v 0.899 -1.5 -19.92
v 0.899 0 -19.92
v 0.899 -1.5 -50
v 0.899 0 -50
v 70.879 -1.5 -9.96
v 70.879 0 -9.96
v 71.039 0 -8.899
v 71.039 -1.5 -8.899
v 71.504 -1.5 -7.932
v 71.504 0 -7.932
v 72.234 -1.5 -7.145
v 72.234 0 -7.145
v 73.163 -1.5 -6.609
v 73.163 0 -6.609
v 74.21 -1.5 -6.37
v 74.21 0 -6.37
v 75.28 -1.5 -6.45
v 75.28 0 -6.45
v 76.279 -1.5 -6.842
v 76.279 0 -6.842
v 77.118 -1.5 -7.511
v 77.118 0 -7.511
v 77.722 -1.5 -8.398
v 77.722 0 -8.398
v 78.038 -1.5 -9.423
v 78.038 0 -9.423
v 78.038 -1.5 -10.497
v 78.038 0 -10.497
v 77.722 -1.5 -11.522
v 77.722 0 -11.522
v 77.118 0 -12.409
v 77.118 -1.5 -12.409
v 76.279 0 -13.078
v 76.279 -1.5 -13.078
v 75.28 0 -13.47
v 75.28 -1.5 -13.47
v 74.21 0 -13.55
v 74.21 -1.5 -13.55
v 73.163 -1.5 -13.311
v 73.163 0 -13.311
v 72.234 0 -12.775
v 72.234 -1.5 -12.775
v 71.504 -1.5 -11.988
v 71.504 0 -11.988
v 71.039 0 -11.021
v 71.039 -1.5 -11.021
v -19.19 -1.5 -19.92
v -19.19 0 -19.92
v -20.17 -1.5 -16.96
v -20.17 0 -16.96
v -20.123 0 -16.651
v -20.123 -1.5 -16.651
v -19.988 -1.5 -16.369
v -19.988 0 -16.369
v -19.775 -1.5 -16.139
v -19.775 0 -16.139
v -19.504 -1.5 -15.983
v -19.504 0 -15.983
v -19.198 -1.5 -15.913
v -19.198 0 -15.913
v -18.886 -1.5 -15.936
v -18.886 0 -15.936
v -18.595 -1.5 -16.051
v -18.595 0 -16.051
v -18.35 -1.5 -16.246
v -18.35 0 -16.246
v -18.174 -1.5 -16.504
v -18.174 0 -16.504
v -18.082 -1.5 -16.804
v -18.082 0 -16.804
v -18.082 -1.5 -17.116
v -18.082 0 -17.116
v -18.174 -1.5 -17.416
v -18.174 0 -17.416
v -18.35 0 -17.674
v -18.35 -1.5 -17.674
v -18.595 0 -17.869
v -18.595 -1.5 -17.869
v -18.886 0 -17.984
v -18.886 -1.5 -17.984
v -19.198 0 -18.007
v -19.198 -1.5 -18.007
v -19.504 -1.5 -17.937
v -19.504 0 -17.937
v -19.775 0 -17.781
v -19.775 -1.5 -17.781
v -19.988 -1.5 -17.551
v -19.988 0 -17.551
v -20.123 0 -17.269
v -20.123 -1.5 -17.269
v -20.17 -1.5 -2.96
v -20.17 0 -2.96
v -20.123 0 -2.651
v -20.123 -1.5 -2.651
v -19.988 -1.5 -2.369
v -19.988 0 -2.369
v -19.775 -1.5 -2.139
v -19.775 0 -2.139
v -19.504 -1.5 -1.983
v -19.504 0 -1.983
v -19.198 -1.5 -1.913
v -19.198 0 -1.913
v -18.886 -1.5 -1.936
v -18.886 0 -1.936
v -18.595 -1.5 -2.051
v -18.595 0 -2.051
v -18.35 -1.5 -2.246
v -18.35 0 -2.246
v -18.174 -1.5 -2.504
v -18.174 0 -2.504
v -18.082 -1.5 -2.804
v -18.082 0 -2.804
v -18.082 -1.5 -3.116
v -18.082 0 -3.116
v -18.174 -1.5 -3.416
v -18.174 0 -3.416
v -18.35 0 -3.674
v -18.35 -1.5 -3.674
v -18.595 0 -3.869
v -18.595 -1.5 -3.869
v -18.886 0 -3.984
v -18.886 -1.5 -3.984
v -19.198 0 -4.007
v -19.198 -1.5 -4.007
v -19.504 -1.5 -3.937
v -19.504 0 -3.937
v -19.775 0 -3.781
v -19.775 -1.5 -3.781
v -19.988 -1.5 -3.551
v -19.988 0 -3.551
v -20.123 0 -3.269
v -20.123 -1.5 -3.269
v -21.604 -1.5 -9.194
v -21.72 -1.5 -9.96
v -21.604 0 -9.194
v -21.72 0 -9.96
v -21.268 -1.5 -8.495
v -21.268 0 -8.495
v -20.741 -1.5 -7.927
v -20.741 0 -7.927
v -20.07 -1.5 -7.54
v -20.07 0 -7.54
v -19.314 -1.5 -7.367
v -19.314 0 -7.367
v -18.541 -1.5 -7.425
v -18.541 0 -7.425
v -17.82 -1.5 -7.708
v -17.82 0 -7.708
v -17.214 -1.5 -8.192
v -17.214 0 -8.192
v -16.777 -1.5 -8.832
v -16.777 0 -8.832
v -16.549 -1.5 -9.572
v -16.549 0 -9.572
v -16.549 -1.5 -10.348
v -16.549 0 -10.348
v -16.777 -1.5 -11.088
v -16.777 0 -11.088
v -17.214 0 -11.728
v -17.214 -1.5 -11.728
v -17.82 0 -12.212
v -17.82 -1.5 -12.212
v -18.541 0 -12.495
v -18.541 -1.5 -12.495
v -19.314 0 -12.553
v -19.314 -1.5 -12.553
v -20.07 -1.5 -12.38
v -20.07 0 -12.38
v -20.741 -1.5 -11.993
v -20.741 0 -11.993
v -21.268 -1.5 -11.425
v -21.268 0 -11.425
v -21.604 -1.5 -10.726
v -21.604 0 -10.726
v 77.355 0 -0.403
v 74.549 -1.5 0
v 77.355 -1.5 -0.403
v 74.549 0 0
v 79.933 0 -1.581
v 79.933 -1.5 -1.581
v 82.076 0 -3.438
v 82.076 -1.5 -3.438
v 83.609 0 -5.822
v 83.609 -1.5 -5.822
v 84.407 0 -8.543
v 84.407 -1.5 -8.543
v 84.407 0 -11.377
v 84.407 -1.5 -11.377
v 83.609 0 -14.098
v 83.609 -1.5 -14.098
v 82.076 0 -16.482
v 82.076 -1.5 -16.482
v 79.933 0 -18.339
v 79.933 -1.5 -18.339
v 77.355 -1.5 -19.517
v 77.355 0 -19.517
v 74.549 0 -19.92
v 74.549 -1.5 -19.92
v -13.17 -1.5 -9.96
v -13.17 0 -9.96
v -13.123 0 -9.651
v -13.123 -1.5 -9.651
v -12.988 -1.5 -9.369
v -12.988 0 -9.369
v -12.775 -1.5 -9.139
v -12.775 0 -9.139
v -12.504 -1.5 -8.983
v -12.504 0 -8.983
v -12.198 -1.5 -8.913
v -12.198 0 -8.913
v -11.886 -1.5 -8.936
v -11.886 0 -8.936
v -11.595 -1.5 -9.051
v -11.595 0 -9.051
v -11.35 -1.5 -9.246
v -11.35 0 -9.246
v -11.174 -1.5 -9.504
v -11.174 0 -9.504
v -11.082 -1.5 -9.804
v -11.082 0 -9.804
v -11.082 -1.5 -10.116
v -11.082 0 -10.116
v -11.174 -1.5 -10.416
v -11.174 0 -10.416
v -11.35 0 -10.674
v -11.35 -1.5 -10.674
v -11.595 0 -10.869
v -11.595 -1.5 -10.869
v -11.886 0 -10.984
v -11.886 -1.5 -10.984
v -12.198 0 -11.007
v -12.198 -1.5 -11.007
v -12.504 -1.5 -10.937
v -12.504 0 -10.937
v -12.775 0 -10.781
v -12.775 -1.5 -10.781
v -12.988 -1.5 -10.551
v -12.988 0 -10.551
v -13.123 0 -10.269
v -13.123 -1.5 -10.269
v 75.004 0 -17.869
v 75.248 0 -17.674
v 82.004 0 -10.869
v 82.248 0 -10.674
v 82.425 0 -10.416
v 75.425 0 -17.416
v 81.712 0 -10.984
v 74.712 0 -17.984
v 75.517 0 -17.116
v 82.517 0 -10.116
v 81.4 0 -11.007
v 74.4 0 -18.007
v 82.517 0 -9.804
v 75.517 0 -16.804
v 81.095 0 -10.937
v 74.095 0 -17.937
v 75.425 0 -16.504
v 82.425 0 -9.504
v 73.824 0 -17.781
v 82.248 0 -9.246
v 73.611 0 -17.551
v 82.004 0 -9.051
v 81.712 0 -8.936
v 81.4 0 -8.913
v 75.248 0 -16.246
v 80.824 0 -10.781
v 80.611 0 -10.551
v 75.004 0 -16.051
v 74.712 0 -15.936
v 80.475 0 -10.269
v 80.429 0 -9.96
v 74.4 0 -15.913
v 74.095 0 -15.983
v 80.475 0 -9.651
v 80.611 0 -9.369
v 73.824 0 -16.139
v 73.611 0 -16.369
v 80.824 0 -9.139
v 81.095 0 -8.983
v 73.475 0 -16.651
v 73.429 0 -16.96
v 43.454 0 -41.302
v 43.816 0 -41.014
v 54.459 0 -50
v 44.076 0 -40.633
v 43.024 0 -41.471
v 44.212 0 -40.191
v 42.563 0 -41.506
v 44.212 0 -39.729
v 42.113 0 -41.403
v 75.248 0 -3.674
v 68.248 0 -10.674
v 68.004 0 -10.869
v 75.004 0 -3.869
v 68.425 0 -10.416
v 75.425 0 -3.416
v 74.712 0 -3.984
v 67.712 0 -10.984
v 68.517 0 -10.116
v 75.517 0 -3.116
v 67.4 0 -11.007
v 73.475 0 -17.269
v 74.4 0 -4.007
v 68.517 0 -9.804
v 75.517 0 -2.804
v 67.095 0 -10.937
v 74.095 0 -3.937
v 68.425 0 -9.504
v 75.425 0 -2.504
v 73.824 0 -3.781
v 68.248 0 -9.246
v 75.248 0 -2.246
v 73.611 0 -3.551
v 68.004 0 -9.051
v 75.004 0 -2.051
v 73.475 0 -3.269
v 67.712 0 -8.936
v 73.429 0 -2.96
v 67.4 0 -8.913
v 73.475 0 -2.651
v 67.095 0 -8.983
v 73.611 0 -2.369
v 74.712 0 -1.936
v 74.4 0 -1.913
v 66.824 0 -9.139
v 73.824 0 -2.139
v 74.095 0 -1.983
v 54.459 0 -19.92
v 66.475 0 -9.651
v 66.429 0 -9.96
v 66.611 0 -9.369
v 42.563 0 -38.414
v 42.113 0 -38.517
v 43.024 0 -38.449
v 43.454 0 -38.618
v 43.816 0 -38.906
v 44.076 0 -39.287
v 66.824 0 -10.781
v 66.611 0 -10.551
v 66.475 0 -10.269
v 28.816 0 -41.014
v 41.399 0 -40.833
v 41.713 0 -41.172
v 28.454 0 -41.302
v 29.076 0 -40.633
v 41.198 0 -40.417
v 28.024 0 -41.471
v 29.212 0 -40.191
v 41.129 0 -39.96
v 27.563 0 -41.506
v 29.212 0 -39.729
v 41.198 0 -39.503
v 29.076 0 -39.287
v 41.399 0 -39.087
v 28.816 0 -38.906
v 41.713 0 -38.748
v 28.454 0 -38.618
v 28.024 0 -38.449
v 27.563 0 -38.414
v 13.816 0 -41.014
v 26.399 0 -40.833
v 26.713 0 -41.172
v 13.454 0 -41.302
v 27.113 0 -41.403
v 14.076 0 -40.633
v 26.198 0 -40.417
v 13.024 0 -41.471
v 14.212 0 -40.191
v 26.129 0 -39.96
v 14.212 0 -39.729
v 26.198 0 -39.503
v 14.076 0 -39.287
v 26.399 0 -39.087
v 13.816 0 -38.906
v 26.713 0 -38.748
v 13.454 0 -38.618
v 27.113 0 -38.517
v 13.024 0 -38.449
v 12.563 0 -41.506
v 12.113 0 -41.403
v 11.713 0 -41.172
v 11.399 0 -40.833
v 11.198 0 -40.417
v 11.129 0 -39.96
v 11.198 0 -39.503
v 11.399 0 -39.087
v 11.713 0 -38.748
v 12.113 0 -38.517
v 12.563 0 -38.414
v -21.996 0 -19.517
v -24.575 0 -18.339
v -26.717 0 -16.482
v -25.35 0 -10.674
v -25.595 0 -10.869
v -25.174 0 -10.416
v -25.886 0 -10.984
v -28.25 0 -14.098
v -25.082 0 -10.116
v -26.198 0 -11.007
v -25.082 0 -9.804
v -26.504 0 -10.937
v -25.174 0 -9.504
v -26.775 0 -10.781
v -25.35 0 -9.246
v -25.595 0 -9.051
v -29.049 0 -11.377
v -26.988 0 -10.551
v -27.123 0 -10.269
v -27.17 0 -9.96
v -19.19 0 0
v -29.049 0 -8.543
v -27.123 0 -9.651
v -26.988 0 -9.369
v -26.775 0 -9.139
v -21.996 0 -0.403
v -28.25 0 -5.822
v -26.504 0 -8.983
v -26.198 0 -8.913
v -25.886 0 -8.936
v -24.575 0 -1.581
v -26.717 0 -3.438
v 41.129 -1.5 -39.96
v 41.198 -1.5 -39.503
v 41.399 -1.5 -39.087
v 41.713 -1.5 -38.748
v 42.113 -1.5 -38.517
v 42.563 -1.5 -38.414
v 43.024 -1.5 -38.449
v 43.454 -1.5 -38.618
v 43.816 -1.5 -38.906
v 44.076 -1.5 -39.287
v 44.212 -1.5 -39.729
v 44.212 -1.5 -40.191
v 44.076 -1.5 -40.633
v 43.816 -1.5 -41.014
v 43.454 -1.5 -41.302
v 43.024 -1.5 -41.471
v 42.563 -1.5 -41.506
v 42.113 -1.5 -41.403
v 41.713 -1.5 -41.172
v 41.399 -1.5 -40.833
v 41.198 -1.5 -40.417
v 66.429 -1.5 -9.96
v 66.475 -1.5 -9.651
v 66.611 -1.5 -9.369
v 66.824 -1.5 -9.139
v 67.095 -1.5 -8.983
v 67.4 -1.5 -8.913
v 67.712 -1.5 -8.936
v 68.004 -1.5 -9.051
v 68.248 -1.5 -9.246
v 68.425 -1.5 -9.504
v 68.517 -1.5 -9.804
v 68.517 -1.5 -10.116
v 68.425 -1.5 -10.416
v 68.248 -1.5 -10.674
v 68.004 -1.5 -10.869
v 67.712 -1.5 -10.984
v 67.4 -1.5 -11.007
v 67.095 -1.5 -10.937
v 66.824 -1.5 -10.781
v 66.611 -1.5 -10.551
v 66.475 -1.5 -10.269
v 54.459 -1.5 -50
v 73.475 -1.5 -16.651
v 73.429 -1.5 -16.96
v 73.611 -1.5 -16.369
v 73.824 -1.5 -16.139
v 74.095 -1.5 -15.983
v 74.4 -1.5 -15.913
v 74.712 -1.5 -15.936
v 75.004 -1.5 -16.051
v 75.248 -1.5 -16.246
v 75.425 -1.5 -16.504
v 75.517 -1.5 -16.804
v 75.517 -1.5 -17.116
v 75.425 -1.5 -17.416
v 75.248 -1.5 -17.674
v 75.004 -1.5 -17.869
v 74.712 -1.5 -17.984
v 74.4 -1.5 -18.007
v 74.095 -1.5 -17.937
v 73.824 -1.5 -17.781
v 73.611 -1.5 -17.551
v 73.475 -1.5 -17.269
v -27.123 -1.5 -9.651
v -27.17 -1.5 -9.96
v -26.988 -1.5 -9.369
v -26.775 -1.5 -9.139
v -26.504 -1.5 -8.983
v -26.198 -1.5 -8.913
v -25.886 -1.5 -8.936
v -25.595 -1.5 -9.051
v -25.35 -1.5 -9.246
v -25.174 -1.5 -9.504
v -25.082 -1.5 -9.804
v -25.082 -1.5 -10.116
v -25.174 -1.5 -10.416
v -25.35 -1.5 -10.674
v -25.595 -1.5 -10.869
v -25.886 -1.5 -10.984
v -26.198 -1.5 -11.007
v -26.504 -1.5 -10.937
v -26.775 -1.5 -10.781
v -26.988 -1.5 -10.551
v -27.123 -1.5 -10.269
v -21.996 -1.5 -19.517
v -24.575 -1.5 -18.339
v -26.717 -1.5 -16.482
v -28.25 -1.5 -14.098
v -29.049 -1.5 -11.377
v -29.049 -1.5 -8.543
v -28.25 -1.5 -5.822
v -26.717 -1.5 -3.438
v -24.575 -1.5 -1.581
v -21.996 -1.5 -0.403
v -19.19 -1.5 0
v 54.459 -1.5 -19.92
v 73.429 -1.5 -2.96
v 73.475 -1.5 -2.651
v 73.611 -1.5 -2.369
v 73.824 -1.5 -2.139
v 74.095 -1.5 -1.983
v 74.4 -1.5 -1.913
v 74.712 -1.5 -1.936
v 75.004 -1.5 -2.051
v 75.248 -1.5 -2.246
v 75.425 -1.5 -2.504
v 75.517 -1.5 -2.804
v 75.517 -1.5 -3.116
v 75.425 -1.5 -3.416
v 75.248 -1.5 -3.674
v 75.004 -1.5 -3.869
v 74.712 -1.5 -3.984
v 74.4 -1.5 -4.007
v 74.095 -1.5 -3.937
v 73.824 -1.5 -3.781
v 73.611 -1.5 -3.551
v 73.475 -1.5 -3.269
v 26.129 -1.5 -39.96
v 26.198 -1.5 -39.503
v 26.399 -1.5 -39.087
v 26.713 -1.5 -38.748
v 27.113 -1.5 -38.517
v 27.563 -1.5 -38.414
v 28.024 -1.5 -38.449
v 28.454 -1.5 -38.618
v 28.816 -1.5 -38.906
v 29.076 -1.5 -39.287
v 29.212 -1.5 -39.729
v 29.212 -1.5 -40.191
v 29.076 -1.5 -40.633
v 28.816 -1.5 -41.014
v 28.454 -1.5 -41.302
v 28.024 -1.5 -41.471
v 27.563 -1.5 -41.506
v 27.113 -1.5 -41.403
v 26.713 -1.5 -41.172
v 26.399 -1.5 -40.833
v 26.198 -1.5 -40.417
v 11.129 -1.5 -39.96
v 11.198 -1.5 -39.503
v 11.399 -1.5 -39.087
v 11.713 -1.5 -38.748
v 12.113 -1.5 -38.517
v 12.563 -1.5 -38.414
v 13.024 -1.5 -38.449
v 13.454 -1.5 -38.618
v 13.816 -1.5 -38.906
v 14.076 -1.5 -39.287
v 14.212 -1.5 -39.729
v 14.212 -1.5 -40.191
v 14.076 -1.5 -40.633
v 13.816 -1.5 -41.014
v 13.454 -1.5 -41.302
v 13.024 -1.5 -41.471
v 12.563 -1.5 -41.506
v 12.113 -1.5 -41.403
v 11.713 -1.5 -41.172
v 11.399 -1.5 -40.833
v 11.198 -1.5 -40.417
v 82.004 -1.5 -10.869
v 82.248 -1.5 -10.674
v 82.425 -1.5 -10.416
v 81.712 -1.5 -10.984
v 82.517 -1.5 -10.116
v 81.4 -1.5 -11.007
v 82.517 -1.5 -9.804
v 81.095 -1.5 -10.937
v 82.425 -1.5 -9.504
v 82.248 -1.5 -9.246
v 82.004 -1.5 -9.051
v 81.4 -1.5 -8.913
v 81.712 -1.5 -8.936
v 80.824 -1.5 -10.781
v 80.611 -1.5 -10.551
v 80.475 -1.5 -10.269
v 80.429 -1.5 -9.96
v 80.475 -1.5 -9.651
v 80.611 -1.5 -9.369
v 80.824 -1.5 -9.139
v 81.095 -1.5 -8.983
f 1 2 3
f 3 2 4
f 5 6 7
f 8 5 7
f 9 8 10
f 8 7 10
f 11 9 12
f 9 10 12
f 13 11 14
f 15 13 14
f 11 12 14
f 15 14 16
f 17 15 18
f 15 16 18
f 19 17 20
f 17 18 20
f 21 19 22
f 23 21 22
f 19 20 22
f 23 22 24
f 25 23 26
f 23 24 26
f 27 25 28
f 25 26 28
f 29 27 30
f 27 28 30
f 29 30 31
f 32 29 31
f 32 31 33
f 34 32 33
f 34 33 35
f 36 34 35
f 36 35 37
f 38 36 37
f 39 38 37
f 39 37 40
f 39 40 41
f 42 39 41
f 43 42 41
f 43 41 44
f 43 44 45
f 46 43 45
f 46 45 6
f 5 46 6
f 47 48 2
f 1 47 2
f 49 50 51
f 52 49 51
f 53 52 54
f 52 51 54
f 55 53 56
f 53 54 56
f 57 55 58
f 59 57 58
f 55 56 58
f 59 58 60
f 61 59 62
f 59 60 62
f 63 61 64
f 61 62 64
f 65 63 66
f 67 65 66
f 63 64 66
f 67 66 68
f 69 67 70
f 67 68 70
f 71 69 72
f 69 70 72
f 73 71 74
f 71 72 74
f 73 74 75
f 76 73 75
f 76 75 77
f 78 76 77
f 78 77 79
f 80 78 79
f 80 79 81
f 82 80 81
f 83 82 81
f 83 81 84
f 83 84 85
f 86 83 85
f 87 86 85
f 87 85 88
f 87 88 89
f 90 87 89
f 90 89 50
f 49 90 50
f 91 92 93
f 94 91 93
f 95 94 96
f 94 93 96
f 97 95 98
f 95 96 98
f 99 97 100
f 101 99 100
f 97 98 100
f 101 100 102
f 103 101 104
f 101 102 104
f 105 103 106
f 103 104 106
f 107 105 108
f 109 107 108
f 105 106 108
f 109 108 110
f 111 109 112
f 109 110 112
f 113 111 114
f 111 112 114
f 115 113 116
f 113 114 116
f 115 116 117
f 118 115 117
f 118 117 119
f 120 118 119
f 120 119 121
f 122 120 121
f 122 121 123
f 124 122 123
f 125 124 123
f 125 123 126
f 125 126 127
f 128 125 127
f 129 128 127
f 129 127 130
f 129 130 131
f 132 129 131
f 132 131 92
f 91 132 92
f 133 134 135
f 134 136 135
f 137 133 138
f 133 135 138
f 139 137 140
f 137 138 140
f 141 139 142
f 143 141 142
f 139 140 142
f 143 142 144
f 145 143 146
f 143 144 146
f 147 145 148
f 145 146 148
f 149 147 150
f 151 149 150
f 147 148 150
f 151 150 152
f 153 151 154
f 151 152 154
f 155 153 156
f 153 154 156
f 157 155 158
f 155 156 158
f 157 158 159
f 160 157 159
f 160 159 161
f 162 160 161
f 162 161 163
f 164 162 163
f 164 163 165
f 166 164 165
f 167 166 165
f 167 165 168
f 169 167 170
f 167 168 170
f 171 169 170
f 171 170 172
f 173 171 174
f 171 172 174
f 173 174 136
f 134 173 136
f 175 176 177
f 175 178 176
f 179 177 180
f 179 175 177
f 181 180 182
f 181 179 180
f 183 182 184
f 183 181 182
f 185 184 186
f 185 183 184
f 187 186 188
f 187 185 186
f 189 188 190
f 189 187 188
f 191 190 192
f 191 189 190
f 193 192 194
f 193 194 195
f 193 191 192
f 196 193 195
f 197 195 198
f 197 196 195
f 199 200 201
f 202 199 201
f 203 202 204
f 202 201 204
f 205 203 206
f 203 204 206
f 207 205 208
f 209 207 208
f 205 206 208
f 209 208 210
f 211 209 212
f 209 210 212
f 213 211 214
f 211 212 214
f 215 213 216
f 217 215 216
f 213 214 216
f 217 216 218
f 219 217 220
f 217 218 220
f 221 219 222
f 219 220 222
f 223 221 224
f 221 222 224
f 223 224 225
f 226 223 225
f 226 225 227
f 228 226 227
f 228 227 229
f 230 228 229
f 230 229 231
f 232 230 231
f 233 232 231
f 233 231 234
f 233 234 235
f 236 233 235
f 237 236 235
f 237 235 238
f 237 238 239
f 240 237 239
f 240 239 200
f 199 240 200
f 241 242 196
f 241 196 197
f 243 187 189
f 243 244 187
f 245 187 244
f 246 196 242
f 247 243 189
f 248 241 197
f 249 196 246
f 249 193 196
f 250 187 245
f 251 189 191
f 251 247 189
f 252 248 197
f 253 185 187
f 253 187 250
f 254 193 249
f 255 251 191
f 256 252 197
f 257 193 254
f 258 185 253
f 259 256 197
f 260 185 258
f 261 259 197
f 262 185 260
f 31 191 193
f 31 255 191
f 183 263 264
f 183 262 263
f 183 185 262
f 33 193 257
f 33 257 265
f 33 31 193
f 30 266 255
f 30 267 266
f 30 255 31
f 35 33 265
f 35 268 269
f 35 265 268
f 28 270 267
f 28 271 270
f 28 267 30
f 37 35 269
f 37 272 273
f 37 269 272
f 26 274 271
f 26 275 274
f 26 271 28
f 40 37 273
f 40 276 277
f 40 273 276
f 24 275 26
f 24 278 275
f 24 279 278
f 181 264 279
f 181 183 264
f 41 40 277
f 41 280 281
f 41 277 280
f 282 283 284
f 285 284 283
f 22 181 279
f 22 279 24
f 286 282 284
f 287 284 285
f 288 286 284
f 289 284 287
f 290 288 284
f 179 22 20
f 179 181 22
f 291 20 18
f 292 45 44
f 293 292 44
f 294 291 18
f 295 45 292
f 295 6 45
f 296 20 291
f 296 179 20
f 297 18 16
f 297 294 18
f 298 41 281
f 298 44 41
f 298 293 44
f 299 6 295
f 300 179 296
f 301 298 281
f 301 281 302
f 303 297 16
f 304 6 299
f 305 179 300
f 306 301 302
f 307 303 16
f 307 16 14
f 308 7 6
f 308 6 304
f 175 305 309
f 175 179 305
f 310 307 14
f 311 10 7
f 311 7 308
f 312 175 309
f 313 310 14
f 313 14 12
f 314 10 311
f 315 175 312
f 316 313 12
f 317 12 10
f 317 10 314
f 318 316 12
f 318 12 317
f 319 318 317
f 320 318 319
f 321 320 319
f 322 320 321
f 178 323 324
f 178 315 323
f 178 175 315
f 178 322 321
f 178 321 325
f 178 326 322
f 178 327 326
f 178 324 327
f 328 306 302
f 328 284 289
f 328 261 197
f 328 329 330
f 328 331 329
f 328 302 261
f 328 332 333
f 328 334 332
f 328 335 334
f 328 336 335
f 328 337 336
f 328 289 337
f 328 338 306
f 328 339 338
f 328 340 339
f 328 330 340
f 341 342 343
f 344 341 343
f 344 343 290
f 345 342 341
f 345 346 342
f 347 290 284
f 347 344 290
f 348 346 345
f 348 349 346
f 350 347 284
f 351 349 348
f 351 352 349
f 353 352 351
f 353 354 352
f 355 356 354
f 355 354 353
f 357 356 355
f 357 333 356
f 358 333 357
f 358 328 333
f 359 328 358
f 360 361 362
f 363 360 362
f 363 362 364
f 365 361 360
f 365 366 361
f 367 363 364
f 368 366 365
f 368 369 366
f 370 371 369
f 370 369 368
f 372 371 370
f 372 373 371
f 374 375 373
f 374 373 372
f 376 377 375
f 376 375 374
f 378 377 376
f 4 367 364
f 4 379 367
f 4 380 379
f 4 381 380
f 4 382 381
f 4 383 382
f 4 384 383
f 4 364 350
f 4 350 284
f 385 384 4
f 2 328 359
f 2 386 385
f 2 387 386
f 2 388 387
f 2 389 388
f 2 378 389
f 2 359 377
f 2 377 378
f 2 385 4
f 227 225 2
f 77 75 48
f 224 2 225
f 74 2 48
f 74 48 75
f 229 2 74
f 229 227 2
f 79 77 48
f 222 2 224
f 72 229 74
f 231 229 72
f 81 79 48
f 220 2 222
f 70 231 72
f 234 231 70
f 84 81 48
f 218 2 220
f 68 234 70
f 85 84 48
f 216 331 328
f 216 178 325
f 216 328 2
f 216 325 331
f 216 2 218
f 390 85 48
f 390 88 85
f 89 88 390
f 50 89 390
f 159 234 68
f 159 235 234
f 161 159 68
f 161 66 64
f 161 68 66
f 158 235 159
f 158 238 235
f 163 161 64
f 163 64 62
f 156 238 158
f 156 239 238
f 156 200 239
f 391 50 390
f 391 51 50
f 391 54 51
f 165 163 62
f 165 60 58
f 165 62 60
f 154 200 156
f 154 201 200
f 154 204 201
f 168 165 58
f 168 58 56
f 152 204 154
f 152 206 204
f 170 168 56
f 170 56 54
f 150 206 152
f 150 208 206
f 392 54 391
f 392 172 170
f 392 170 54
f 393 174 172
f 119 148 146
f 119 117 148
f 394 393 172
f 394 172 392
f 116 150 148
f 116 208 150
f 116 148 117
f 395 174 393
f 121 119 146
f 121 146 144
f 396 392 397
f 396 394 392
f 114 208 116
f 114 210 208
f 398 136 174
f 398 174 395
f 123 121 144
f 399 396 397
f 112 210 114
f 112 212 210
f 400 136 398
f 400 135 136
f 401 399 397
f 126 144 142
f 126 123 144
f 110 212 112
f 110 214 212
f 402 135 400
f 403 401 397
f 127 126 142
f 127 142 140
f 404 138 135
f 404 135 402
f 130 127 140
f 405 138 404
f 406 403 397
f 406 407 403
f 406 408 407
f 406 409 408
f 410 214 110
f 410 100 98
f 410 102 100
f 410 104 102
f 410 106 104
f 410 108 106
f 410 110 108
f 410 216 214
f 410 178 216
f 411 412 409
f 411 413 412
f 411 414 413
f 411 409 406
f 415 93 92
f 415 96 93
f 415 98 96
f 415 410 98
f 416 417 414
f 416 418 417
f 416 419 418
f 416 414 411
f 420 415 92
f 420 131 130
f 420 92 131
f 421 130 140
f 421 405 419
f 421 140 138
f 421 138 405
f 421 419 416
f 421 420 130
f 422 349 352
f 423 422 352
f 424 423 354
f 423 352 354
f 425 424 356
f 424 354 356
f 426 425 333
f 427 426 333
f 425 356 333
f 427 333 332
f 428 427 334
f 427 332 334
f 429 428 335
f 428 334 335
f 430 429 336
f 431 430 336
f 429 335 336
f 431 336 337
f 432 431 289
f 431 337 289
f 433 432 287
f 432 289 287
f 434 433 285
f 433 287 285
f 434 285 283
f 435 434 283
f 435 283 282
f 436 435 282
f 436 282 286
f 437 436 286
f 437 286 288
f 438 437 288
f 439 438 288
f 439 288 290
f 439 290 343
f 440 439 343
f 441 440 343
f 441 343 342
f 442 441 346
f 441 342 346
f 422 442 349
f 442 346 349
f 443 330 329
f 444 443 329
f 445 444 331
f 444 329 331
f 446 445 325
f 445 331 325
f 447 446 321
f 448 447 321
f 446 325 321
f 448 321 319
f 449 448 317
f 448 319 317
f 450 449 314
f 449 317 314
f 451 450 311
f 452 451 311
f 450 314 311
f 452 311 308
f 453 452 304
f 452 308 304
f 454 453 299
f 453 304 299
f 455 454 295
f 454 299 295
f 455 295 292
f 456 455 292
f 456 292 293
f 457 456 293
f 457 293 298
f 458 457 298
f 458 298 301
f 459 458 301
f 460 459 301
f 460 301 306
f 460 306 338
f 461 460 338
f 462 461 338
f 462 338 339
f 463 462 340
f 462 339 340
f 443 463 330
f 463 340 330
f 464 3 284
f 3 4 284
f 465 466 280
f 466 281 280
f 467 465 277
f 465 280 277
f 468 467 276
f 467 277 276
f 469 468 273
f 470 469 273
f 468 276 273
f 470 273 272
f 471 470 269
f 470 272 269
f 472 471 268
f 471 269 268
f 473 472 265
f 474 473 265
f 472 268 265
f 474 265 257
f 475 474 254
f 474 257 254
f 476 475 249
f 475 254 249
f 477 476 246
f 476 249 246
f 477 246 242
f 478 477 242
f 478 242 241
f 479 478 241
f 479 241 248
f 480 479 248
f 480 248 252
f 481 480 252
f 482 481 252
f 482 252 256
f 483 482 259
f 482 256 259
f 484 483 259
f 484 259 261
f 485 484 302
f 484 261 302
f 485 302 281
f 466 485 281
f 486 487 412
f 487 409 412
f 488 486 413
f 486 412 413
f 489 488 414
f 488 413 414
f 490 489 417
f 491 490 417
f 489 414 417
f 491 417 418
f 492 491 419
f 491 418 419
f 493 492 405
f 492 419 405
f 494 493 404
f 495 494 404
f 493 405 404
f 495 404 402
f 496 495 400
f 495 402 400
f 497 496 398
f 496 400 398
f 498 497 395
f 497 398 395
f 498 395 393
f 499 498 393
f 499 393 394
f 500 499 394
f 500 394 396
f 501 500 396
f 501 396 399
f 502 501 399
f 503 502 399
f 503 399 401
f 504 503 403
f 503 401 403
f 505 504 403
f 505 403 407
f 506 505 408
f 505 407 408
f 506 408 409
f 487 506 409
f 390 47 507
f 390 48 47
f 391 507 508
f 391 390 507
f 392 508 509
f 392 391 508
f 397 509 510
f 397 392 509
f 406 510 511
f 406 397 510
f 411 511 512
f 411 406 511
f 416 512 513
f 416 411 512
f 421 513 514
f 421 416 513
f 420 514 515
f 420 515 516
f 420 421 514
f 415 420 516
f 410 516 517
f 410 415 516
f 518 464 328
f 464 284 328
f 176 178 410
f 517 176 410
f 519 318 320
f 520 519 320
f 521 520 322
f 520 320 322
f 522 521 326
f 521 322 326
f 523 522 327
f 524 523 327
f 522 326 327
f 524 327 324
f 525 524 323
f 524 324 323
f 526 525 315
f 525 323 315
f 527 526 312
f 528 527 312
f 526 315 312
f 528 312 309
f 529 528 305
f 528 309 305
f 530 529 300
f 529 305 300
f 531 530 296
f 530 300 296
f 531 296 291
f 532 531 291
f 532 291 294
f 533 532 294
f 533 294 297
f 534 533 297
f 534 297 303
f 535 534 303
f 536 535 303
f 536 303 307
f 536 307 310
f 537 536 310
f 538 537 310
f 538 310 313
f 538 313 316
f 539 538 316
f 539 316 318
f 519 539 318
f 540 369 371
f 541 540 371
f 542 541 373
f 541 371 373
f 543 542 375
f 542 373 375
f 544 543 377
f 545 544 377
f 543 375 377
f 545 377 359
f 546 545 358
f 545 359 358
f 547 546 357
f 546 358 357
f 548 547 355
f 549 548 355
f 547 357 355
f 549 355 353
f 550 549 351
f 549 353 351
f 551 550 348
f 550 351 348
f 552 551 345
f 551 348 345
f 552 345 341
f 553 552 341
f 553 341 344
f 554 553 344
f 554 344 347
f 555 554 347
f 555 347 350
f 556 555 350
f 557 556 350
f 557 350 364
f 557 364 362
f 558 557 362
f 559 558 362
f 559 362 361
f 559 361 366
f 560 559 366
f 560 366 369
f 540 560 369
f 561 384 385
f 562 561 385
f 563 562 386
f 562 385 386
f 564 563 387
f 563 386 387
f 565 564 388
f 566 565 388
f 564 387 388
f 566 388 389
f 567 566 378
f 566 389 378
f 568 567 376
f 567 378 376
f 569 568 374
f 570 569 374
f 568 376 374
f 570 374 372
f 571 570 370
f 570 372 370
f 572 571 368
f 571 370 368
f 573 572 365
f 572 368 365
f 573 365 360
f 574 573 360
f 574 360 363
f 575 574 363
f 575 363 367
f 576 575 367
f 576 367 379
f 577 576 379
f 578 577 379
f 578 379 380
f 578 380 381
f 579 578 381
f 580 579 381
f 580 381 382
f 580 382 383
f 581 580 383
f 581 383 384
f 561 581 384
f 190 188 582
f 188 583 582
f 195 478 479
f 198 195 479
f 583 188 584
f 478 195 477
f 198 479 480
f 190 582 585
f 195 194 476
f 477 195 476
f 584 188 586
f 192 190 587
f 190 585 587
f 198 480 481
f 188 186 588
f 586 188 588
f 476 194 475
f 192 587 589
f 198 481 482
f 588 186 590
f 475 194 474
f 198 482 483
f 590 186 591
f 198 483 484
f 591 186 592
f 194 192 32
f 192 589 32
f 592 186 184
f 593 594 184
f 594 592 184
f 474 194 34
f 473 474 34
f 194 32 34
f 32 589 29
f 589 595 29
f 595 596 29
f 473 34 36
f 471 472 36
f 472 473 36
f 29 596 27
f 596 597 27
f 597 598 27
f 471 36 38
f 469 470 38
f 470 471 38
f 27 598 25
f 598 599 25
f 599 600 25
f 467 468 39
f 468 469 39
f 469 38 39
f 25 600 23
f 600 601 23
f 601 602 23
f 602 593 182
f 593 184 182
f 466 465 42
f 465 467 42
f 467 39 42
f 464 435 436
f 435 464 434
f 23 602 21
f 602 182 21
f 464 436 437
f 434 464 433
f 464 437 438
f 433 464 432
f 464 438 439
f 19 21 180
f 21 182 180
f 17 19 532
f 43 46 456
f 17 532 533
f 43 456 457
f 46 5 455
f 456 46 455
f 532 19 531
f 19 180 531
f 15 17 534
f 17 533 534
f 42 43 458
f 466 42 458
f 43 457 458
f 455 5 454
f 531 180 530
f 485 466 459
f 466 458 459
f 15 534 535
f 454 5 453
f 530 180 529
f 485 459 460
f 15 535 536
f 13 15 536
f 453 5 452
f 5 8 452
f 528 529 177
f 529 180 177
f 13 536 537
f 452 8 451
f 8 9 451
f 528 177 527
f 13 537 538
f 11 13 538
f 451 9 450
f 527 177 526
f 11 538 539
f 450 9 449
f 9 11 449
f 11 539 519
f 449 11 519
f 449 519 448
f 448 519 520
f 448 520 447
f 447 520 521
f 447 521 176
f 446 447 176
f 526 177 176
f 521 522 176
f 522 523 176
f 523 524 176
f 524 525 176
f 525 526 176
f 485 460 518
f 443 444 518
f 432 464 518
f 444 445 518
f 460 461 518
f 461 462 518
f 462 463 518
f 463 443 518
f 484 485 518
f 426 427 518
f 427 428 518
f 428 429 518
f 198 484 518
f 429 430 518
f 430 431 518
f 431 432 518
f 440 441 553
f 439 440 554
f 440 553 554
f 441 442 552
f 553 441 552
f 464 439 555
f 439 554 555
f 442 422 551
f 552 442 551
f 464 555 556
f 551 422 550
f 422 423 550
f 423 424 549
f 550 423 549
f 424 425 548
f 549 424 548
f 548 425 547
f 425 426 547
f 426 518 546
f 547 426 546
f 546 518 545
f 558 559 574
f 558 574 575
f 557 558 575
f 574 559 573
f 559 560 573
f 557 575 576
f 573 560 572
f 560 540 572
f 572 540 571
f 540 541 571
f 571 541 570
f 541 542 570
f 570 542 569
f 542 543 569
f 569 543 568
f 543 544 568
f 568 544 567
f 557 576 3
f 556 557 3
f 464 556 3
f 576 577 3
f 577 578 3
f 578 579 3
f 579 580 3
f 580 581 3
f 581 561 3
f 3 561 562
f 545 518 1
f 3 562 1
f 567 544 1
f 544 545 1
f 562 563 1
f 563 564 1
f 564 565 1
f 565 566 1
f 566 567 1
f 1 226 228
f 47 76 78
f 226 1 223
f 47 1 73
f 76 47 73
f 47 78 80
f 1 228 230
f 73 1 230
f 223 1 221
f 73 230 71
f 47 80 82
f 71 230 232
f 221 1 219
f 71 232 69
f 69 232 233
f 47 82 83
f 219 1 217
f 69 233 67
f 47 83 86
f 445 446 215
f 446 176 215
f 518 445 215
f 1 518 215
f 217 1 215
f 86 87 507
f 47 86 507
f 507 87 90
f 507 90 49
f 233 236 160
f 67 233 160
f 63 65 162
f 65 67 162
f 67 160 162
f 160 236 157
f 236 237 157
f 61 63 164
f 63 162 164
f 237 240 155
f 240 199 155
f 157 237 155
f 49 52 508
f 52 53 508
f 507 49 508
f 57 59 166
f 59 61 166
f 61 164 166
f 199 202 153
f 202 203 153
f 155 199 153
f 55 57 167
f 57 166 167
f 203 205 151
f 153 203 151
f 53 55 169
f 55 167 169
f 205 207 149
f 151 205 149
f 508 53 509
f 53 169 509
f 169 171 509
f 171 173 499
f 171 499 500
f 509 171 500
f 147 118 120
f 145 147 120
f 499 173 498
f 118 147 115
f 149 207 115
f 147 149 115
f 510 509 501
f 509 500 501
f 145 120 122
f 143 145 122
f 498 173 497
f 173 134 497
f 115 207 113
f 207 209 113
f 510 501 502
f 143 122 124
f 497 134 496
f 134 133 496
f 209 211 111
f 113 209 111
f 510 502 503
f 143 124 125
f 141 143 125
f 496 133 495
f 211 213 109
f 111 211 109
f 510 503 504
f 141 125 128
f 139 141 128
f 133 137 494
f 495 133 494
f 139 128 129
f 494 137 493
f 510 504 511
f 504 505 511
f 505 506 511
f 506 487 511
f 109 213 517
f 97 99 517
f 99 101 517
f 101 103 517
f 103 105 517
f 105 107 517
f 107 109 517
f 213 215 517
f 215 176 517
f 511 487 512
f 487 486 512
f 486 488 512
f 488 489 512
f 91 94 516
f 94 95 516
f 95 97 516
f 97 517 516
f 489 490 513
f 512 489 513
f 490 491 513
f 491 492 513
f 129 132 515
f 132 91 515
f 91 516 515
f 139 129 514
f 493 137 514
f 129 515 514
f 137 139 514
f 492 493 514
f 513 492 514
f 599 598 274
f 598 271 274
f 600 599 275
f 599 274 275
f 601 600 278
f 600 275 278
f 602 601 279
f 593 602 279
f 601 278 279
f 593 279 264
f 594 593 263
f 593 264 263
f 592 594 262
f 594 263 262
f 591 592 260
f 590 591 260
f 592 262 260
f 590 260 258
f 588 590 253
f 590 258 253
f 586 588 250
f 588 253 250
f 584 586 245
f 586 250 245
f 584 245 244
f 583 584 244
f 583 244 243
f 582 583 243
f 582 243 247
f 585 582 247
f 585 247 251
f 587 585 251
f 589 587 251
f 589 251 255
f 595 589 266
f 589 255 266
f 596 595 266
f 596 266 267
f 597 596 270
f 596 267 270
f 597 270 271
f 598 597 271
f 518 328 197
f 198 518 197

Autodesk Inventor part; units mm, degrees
ref_plane "YZ Plane" through (0, 0, 0) normal (1, 0, 0) x (0, 1, 0)
ref_plane "XZ Plane" through (0, 0, 0) normal (0, 1, 0) x (-1, 0, 0)
ref_plane "XY Plane" through (0, 0, 0) normal (0, 0, 1) x (1, 0, 0)
sketch "Sketch1" plane through (0, 0, 0) normal (0, 1, 0) x (-1, 0, 0)
  line L0 (-54.9089, 0) -> (-54.9089, -19.92)
  line L1 (-0.4496, -19.92) -> (-0.4496, 0)
  circle A0 centre (-74.4786, -9.96) radius 3.6
  circle A1 centre (-81.4786, -9.96) radius 1.05
  circle A2 centre (-74.4786, -16.96) radius 1.05
  circle A3 centre (-67.4786, -9.96) radius 1.05
  circle A4 centre (-74.4786, -2.96) radius 1.05
  circle A5 centre (19.12, -9.96) radius 2.6
  circle A6 centre (26.12, -9.96) radius 1.05
  circle A7 centre (19.12, -16.96) radius 1.05
  circle A8 centre (12.12, -9.96) radius 1.05
  circle A9 centre (19.12, -2.96) radius 1.05
  circle A10 centre (-42.6793, -39.96) radius 1.55
  circle A11 centre (-27.6793, -39.96) radius 1.55
  circle A12 centre (-12.6793, -39.96) radius 1.55
  arc A13 (19.19, -19.92) -> (19.19, 0) centre (19.19, -9.96) ccw
  line L2 (19.19, -19.92) -> (-0.8993, -19.92)
  arc A14 (-74.5486, 0) -> (-74.5486, -19.92) centre (-74.5486, -9.96) ccw
  line L3 (-54.4593, -19.92) -> (-74.5486, -19.92)
  line L4 (-54.4593, -50) -> (-54.4593, -19.92)
  line L5 (-0.8993, -19.92) -> (-0.8993, -50)
  line L6 (-0.8993, -50) -> (-54.4593, -50)
  line L7 (-74.5486, 0) -> (19.19, 0)
  line L8 (-55.3586, -19.92) -> (-55.3586, 0)
  line L9 (-54.4593, 0) -> (-54.4593, -19.92)
  line L10 (-0.8993, -19.92) -> (-0.8993, 0)
  line L11 (0, 0) -> (0, -19.92)
extrude "Extrusion1" add sketch "Sketch1" against normal blind 1.5
properties part number "axis_23_bottom_frame"
